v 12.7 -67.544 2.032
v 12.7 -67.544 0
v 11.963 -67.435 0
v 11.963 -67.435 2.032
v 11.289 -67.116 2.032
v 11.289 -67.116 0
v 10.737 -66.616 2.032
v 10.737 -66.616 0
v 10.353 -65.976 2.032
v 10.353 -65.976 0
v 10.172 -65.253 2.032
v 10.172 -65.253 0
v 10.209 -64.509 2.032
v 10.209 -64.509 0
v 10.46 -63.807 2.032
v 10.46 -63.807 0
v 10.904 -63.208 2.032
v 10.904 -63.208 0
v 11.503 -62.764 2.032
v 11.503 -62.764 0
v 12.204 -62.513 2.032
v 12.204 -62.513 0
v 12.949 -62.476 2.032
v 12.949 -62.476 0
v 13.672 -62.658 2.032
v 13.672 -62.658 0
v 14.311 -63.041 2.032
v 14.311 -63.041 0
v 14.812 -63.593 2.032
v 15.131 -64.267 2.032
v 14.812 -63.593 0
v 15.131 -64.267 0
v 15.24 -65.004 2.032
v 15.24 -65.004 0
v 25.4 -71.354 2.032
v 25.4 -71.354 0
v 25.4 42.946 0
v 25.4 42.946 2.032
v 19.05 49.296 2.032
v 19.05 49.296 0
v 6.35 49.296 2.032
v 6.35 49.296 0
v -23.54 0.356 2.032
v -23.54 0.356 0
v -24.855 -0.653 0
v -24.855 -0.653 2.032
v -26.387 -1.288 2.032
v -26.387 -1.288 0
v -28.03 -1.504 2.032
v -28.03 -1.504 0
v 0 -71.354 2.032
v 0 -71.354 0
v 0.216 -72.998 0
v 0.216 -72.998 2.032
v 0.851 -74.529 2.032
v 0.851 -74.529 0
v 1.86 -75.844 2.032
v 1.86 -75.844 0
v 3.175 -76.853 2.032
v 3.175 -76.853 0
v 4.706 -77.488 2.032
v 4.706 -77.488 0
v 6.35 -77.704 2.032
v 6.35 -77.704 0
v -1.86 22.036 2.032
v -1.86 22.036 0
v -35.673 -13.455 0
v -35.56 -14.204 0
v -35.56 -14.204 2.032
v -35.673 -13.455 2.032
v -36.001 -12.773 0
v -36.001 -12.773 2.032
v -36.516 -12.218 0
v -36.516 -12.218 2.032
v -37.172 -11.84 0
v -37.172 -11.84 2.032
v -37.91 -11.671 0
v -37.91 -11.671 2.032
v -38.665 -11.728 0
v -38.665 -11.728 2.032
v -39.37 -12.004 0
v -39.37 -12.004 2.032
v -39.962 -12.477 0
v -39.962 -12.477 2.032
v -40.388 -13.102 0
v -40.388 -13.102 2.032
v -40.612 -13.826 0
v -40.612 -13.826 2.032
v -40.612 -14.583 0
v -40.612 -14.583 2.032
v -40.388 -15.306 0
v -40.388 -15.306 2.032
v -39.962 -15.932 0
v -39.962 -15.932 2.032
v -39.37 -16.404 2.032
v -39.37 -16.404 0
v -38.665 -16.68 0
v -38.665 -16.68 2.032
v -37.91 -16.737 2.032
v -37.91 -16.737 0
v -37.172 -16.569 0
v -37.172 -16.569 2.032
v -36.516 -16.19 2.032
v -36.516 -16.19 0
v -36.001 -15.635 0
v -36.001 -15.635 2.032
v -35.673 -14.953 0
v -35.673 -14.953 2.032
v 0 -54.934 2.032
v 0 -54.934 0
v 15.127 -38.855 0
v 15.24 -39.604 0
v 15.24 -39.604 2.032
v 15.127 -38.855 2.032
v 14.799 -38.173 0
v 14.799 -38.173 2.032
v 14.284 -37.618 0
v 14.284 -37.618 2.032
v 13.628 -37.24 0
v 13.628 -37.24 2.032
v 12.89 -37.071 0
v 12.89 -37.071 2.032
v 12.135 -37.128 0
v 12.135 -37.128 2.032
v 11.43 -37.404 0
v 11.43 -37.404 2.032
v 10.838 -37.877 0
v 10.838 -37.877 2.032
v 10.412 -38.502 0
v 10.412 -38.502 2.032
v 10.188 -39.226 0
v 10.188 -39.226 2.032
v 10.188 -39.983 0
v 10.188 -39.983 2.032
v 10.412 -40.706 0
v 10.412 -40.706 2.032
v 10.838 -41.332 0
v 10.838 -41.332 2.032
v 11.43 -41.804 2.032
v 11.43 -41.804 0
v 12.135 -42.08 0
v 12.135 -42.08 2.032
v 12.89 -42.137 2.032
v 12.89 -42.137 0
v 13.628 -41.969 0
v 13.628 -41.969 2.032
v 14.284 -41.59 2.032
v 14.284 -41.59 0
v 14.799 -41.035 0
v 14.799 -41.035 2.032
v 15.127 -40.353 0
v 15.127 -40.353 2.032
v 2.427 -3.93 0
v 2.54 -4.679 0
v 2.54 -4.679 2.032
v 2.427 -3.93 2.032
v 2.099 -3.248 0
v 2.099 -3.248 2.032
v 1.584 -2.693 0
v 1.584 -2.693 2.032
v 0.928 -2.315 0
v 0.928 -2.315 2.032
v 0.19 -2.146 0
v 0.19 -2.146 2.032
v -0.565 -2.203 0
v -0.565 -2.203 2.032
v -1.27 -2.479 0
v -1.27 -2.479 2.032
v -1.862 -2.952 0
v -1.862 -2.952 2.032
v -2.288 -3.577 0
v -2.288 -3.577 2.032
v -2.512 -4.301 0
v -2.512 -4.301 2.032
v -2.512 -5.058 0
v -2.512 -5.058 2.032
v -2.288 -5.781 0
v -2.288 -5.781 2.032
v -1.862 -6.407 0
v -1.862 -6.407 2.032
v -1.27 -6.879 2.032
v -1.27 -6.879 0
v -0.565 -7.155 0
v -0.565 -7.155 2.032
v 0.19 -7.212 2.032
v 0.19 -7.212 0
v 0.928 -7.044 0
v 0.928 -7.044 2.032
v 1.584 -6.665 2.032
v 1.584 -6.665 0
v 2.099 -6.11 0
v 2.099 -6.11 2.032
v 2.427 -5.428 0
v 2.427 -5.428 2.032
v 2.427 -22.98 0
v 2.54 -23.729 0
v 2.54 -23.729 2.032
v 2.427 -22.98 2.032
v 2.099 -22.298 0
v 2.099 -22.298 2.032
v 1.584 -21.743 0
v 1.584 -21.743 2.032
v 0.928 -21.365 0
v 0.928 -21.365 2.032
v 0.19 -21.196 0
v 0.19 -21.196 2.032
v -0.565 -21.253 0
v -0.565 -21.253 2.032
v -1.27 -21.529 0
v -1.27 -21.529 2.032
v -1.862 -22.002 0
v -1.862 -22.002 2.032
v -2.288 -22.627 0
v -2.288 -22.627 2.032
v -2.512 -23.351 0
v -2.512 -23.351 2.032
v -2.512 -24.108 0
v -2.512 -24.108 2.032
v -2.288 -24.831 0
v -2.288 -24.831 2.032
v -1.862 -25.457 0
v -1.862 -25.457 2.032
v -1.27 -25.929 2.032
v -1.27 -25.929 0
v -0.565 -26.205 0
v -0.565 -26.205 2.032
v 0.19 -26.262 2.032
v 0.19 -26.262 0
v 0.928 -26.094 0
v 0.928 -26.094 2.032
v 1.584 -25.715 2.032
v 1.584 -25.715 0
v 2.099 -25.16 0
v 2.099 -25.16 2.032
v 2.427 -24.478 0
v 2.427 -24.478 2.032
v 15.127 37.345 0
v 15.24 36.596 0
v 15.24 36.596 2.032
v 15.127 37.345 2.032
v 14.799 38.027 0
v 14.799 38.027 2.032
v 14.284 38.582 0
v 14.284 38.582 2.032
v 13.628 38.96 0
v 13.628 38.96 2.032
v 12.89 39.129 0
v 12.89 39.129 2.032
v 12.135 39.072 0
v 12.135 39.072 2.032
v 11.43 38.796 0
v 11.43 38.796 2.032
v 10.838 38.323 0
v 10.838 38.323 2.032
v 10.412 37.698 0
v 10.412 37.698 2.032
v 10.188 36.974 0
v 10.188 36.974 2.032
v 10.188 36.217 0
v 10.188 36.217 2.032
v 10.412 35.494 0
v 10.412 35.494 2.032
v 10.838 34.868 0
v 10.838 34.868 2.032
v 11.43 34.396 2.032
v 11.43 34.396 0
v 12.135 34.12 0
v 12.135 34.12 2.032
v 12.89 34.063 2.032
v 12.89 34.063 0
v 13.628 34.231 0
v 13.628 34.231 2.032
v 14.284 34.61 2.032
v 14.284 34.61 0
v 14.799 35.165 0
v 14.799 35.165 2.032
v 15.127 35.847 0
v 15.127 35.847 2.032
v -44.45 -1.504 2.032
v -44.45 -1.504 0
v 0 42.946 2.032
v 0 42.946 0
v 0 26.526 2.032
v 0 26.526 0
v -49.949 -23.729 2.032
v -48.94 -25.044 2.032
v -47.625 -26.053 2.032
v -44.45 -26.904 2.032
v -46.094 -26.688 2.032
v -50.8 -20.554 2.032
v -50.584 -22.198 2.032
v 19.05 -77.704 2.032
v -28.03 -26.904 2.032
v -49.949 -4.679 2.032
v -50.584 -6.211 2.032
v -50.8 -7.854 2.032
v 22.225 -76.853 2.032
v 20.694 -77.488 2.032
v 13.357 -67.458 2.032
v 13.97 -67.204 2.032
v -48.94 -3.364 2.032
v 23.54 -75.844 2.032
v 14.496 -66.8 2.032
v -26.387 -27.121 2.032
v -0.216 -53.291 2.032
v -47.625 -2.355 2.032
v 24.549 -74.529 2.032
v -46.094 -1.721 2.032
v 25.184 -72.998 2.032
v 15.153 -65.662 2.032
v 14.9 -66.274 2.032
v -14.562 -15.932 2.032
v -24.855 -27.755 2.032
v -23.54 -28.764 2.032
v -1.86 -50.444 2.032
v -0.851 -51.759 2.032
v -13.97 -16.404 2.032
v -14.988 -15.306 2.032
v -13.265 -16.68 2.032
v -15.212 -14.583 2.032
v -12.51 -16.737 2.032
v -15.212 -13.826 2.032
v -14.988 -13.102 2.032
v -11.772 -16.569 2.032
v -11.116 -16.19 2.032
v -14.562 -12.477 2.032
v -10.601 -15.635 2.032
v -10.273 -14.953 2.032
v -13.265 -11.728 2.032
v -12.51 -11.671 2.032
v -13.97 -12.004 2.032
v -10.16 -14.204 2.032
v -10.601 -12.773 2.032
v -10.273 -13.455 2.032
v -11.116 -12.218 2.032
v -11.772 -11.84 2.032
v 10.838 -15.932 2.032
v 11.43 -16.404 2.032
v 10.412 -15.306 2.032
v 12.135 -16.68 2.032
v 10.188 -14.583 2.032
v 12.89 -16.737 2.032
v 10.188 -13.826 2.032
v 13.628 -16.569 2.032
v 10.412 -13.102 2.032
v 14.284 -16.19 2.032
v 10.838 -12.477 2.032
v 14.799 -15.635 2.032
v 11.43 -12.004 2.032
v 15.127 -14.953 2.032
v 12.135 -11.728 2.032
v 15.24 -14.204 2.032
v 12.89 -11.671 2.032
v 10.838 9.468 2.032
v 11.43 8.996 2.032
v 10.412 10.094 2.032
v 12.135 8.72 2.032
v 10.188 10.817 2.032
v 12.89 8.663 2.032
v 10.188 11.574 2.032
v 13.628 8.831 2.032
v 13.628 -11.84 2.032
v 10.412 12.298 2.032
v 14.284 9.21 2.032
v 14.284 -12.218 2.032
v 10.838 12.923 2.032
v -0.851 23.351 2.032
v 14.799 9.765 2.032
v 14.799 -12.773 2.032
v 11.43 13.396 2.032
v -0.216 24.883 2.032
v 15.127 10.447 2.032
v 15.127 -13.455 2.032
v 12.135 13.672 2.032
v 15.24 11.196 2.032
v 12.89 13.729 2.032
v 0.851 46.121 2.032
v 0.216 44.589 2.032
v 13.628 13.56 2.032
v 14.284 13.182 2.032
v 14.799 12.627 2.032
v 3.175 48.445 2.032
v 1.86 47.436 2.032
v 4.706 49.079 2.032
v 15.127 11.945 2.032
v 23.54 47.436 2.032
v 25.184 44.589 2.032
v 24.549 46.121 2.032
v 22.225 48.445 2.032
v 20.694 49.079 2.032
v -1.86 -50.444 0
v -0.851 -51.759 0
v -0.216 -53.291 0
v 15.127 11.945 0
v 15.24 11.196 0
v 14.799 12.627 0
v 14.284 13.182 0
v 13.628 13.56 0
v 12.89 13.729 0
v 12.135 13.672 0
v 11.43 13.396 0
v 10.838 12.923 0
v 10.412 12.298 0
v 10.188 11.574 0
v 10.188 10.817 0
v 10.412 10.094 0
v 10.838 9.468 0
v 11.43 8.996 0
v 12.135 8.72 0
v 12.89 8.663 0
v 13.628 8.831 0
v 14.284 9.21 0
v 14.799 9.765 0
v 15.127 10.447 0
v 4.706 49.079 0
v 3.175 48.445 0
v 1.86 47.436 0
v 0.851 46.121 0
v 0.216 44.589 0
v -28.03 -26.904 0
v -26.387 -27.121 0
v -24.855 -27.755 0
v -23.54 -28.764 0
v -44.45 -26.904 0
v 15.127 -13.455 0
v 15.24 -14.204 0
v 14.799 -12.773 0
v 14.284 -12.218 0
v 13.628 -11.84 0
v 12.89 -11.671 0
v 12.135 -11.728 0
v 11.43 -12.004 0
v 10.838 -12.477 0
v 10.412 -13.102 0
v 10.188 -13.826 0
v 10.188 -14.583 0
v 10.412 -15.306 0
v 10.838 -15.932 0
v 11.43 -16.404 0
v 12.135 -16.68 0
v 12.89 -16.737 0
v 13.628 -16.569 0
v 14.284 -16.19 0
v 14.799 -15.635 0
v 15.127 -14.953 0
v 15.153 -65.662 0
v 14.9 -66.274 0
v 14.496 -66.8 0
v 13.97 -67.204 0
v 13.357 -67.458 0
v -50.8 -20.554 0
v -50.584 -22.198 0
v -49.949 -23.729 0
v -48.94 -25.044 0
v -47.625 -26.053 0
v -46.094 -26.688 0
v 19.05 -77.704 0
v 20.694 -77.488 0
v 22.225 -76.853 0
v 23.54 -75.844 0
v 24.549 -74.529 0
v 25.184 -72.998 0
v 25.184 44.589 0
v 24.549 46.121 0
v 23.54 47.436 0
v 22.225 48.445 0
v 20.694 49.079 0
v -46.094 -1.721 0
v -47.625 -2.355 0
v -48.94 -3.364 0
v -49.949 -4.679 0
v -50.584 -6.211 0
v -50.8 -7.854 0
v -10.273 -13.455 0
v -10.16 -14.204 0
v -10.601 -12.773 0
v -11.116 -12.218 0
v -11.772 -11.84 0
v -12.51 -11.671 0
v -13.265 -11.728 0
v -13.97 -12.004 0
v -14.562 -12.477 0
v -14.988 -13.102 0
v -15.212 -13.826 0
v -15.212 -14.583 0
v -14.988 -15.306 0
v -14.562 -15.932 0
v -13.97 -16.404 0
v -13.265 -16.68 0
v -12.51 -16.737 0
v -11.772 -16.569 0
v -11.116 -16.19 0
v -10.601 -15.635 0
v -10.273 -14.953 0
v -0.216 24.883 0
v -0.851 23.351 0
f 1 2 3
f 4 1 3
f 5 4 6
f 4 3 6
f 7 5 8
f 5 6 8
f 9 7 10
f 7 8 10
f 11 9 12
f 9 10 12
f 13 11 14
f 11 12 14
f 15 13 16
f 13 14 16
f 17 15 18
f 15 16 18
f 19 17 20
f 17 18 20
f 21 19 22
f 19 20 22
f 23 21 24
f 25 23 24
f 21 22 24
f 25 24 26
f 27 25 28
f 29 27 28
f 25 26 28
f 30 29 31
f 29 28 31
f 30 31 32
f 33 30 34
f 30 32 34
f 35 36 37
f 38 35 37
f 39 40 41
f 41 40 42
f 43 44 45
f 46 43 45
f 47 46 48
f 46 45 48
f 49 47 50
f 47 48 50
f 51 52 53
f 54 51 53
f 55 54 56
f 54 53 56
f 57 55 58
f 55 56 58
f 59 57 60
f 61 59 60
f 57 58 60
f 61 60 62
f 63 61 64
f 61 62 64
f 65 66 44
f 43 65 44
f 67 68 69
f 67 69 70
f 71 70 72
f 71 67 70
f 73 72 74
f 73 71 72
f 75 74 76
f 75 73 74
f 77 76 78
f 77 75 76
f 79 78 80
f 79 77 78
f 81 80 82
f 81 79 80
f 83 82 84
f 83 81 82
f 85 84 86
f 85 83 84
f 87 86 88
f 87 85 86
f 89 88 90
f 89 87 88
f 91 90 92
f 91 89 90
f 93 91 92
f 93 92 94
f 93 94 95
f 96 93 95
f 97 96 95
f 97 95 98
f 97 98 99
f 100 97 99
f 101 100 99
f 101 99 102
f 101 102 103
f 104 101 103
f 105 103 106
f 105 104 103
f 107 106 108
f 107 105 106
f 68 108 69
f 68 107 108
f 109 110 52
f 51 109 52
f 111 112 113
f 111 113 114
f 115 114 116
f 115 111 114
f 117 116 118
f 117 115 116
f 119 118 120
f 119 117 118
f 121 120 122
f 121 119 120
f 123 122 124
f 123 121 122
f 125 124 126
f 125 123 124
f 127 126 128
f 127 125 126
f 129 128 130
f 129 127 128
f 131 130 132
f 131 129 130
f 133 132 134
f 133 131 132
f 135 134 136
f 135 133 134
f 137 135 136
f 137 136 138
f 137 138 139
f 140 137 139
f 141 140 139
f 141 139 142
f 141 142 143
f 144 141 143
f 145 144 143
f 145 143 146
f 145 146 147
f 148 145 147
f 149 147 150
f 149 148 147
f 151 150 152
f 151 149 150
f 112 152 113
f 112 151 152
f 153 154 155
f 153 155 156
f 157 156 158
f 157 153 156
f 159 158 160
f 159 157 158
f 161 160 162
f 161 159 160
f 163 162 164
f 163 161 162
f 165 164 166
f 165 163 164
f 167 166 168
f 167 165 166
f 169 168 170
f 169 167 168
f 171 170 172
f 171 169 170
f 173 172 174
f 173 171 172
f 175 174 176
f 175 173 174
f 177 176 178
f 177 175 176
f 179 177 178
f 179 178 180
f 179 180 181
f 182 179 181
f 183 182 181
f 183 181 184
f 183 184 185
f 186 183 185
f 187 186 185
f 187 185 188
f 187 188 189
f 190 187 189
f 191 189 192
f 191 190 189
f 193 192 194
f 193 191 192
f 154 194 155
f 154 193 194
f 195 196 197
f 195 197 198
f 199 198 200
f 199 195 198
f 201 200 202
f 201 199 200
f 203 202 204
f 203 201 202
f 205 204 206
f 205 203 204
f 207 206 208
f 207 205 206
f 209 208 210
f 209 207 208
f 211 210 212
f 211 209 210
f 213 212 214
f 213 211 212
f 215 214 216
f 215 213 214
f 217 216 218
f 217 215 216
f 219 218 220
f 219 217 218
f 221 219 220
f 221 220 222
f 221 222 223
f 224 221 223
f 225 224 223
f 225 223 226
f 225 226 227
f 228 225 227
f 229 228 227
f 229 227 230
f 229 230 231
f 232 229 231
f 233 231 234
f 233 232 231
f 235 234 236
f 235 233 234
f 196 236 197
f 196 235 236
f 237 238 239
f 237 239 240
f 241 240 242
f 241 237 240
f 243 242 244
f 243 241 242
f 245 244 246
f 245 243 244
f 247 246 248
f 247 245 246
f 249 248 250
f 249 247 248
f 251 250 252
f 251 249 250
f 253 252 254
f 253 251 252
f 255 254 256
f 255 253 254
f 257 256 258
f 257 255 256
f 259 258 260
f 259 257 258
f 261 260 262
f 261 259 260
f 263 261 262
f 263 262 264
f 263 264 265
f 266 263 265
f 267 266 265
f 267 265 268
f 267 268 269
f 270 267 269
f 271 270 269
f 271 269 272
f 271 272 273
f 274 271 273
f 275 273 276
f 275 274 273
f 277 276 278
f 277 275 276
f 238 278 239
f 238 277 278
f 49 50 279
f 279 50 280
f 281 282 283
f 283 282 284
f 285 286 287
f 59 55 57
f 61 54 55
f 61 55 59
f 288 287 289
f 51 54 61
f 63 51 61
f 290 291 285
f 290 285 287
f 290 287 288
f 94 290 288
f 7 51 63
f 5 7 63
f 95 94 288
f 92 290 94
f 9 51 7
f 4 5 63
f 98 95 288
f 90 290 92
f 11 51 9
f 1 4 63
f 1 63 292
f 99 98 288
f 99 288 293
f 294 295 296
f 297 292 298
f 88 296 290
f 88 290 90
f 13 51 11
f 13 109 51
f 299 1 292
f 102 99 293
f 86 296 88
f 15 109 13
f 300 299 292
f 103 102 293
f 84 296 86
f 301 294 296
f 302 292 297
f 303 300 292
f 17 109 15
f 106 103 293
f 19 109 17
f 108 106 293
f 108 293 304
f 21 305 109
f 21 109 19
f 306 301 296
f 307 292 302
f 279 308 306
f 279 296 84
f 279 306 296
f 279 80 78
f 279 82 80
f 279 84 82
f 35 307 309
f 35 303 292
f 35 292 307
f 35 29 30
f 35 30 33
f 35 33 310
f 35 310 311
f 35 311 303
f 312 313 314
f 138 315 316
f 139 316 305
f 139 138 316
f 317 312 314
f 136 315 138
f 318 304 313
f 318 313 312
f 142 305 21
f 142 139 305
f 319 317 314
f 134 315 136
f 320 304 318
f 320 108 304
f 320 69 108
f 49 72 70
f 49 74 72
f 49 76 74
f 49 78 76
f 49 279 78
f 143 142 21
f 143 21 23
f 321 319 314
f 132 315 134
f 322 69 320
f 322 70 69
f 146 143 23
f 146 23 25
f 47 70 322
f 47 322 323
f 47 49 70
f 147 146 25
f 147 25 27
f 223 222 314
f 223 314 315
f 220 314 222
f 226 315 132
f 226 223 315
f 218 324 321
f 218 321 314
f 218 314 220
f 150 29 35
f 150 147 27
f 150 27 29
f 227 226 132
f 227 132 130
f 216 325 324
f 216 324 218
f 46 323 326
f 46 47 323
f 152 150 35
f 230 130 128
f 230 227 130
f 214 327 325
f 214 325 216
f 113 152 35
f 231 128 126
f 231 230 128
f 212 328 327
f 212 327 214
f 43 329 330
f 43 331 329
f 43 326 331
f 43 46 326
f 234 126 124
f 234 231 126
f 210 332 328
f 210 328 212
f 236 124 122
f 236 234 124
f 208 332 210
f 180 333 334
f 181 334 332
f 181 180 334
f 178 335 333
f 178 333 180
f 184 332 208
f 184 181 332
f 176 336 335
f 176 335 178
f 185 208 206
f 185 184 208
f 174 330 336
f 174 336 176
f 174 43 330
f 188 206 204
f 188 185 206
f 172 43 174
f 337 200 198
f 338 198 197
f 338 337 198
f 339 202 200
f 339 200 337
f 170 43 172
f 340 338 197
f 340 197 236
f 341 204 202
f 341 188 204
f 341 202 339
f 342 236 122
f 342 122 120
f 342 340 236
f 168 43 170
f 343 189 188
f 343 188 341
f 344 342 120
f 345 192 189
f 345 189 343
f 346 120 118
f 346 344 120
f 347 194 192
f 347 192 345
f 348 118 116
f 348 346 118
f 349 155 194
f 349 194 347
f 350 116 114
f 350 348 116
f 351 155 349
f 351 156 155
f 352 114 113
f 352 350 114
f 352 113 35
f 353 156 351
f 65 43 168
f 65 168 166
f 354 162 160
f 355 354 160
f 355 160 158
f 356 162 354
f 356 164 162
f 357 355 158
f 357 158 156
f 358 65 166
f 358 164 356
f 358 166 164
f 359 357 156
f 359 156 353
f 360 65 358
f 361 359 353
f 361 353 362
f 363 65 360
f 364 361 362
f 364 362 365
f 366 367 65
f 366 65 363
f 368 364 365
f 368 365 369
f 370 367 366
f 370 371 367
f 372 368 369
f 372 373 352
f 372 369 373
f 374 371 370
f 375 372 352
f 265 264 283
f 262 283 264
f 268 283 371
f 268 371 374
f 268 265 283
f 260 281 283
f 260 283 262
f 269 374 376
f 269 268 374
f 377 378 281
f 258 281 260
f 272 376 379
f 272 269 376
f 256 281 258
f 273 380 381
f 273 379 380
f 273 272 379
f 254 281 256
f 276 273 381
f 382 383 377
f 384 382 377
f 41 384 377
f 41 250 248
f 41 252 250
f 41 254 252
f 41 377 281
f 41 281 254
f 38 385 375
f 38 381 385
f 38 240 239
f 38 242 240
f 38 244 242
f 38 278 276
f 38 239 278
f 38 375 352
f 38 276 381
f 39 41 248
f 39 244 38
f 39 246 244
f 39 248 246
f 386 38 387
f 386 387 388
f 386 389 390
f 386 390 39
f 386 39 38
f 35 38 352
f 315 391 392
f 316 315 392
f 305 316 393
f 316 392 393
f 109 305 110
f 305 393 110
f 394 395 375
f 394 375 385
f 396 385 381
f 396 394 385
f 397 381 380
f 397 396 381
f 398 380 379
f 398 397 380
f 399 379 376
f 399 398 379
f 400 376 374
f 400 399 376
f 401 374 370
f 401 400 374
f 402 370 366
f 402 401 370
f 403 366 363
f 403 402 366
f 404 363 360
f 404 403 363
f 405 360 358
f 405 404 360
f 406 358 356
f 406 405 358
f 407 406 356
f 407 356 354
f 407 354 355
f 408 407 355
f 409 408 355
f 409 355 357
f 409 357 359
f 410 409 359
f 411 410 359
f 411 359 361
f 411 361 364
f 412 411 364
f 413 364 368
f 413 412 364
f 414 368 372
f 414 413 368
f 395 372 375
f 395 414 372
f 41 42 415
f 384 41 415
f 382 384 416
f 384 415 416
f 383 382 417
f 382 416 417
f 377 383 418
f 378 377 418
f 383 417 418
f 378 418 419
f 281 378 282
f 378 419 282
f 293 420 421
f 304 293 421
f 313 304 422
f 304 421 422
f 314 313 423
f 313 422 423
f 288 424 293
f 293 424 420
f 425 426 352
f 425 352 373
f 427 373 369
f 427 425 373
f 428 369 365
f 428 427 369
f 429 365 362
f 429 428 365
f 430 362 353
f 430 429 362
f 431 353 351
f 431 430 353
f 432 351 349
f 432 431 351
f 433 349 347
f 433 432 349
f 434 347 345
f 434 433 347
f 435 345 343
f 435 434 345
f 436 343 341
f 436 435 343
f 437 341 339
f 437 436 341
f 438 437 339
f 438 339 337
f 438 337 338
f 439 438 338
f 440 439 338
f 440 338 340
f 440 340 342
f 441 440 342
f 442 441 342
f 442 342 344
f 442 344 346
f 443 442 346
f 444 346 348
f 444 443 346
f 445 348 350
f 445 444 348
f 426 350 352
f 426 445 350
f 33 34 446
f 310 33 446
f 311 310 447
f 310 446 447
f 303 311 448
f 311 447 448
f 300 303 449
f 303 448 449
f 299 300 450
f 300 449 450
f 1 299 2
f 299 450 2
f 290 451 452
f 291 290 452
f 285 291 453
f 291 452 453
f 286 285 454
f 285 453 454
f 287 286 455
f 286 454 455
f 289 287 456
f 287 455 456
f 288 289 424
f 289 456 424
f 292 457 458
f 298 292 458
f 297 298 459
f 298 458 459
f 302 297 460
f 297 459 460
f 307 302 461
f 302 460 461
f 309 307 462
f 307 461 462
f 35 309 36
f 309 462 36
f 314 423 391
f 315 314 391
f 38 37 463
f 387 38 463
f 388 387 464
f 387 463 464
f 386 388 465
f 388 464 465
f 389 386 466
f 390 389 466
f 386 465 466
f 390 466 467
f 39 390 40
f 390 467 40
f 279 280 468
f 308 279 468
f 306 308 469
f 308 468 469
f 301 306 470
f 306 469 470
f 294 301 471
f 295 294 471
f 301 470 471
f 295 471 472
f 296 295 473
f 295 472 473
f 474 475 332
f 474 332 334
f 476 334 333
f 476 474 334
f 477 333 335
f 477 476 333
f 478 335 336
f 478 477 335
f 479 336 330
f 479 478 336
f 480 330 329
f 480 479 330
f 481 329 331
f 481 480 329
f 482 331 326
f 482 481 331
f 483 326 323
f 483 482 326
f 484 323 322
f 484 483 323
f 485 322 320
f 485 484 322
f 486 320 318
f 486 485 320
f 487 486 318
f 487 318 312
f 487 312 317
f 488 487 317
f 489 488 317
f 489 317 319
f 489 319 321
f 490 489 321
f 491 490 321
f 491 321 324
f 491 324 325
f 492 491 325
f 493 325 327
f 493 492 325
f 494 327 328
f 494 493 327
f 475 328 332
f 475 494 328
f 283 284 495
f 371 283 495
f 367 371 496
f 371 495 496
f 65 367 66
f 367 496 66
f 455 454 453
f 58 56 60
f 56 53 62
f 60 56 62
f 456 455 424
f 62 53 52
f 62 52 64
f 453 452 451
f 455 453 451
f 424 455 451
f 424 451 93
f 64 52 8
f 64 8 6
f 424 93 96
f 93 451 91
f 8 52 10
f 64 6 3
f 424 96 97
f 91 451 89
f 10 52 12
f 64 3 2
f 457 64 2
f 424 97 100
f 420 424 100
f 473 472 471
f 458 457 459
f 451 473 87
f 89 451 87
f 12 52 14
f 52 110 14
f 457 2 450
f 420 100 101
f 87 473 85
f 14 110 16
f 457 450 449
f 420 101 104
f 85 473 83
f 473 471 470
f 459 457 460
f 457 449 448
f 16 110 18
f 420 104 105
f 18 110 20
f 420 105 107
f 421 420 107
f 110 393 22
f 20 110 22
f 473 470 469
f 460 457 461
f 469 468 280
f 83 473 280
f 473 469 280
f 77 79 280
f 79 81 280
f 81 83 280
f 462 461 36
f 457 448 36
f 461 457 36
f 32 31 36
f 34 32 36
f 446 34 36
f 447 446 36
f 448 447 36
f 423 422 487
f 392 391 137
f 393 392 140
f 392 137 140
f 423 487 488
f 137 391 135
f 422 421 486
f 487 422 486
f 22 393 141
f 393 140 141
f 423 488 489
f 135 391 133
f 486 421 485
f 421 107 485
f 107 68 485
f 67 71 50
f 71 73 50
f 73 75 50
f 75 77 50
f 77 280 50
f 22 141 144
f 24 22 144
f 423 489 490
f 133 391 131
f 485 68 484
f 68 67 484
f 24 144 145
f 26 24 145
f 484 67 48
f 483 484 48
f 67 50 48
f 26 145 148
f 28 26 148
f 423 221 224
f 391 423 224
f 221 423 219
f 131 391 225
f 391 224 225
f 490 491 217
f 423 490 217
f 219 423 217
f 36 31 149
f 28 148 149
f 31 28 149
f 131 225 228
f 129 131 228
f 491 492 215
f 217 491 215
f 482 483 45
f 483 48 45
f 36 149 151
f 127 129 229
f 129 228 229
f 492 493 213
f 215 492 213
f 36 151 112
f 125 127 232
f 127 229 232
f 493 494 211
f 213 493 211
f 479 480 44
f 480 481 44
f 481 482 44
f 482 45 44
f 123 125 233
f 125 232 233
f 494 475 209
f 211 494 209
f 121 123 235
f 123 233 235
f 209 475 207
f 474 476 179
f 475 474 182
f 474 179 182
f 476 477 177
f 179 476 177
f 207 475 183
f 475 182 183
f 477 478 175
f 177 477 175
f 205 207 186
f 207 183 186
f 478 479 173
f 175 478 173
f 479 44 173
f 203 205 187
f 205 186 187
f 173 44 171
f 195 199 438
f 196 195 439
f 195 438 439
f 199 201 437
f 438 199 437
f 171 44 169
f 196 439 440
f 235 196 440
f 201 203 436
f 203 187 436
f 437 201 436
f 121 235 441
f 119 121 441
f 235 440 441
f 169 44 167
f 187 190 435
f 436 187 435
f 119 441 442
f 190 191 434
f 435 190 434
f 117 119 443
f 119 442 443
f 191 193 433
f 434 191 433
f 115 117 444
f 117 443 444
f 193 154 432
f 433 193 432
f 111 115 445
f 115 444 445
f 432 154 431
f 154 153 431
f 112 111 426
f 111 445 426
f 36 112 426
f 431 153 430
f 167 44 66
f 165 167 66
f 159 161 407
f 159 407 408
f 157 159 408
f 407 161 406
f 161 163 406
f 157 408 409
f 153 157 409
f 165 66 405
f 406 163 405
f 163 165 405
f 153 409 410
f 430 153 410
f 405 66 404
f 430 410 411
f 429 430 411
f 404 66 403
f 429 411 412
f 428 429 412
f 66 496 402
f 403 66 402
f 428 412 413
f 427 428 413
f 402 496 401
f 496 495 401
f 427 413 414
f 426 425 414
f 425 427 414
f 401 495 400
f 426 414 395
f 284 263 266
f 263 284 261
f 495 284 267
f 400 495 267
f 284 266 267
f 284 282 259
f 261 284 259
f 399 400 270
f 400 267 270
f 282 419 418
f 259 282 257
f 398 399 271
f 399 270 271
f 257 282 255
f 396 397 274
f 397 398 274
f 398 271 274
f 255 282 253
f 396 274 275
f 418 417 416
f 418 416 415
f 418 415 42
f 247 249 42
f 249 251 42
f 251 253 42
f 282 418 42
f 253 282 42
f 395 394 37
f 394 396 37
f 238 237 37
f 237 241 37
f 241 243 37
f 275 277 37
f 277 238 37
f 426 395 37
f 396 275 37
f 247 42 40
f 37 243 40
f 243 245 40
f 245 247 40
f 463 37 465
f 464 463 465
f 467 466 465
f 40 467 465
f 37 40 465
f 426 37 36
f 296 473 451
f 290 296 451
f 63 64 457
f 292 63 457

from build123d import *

# Parameters (mm, degrees)
F0_R     = 2.54
F1_DEPTH = 2.032


with BuildPart() as f1:
    # F0 (on Top) → F1 (new body)
    with BuildSketch(Plane.XY):
        with BuildLine():
            ThreePointArc((19.05, -77.704174), (23.540128, -75.844302), (25.4, -71.354174))
            Line((25.4, -71.354174), (25.4, 42.945826))
            ThreePointArc((25.4, 42.945826), (23.540128, 47.435954), (19.05, 49.295826))
            Line((19.05, 49.295826), (6.35, 49.295826))
            ThreePointArc((6.35, 49.295826), (1.859872, 47.435954), (0, 42.945826))
            Line((0, 42.945826), (0, 26.526082))
            ThreePointArc((0, 26.526082), (-0.483365, 24.096043), (-1.859872, 22.035954))
            Line((-1.859872, 22.035954), (-23.540128, 0.355698))
            ThreePointArc((-23.540128, 0.355698), (-25.600216, -1.020809), (-28.030256, -1.504174))
            Line((-28.030256, -1.504174), (-44.45, -1.504174))
            ThreePointArc((-44.45, -1.504174), (-48.940128, -3.364046), (-50.8, -7.854174))
            Line((-50.8, -7.854174), (-50.8, -14.204174))
            Line((-50.8, -14.204174), (-50.8, -20.554174))
            ThreePointArc((-50.8, -20.554174), (-48.940128, -25.044302), (-44.45, -26.904174))
            Line((-44.45, -26.904174), (-28.030256, -26.904174))
            ThreePointArc((-28.030256, -26.904174), (-25.600216, -27.387539), (-23.540128, -28.764046))
            Line((-23.540128, -28.764046), (-1.859872, -50.444302))
            ThreePointArc((-1.859872, -50.444302), (-0.483365, -52.50439), (0, -54.93443))
            Line((0, -54.93443), (0, -71.354174))
            ThreePointArc((0, -71.354174), (1.859872, -75.844302), (6.35, -77.704174))
            Line((6.35, -77.704174), (12.7, -77.704174))
            Line((12.7, -77.704174), (19.05, -77.704174))
        make_face()
        with BuildLine():
            ThreePointArc((15.24, -65.004174), (14.496051, -66.800225), (12.7, -67.544174))
            ThreePointArc((12.7, -67.544174), (10.903949, -63.208123), (15.24, -65.004174))
        make_face(mode=Mode.SUBTRACT)
        with Locations((0, -23.729174)):
            Circle(F0_R, mode=Mode.SUBTRACT)
        with Locations((12.7, -39.604174)):
            Circle(F0_R, mode=Mode.SUBTRACT)
        with Locations((-38.1, -14.204174)):
            Circle(F0_R, mode=Mode.SUBTRACT)
        with Locations((-12.7, -14.204174)):
            Circle(F0_R, mode=Mode.SUBTRACT)
        with Locations((0, -4.679174)):
            Circle(F0_R, mode=Mode.SUBTRACT)
        with Locations((12.7, -14.204174)):
            Circle(F0_R, mode=Mode.SUBTRACT)
        with Locations((12.7, 11.195826)):
            Circle(F0_R, mode=Mode.SUBTRACT)
        with Locations((12.7, 36.595826)):
            Circle(F0_R, mode=Mode.SUBTRACT)
    extrude(amount=F1_DEPTH)


solid = f1.part
